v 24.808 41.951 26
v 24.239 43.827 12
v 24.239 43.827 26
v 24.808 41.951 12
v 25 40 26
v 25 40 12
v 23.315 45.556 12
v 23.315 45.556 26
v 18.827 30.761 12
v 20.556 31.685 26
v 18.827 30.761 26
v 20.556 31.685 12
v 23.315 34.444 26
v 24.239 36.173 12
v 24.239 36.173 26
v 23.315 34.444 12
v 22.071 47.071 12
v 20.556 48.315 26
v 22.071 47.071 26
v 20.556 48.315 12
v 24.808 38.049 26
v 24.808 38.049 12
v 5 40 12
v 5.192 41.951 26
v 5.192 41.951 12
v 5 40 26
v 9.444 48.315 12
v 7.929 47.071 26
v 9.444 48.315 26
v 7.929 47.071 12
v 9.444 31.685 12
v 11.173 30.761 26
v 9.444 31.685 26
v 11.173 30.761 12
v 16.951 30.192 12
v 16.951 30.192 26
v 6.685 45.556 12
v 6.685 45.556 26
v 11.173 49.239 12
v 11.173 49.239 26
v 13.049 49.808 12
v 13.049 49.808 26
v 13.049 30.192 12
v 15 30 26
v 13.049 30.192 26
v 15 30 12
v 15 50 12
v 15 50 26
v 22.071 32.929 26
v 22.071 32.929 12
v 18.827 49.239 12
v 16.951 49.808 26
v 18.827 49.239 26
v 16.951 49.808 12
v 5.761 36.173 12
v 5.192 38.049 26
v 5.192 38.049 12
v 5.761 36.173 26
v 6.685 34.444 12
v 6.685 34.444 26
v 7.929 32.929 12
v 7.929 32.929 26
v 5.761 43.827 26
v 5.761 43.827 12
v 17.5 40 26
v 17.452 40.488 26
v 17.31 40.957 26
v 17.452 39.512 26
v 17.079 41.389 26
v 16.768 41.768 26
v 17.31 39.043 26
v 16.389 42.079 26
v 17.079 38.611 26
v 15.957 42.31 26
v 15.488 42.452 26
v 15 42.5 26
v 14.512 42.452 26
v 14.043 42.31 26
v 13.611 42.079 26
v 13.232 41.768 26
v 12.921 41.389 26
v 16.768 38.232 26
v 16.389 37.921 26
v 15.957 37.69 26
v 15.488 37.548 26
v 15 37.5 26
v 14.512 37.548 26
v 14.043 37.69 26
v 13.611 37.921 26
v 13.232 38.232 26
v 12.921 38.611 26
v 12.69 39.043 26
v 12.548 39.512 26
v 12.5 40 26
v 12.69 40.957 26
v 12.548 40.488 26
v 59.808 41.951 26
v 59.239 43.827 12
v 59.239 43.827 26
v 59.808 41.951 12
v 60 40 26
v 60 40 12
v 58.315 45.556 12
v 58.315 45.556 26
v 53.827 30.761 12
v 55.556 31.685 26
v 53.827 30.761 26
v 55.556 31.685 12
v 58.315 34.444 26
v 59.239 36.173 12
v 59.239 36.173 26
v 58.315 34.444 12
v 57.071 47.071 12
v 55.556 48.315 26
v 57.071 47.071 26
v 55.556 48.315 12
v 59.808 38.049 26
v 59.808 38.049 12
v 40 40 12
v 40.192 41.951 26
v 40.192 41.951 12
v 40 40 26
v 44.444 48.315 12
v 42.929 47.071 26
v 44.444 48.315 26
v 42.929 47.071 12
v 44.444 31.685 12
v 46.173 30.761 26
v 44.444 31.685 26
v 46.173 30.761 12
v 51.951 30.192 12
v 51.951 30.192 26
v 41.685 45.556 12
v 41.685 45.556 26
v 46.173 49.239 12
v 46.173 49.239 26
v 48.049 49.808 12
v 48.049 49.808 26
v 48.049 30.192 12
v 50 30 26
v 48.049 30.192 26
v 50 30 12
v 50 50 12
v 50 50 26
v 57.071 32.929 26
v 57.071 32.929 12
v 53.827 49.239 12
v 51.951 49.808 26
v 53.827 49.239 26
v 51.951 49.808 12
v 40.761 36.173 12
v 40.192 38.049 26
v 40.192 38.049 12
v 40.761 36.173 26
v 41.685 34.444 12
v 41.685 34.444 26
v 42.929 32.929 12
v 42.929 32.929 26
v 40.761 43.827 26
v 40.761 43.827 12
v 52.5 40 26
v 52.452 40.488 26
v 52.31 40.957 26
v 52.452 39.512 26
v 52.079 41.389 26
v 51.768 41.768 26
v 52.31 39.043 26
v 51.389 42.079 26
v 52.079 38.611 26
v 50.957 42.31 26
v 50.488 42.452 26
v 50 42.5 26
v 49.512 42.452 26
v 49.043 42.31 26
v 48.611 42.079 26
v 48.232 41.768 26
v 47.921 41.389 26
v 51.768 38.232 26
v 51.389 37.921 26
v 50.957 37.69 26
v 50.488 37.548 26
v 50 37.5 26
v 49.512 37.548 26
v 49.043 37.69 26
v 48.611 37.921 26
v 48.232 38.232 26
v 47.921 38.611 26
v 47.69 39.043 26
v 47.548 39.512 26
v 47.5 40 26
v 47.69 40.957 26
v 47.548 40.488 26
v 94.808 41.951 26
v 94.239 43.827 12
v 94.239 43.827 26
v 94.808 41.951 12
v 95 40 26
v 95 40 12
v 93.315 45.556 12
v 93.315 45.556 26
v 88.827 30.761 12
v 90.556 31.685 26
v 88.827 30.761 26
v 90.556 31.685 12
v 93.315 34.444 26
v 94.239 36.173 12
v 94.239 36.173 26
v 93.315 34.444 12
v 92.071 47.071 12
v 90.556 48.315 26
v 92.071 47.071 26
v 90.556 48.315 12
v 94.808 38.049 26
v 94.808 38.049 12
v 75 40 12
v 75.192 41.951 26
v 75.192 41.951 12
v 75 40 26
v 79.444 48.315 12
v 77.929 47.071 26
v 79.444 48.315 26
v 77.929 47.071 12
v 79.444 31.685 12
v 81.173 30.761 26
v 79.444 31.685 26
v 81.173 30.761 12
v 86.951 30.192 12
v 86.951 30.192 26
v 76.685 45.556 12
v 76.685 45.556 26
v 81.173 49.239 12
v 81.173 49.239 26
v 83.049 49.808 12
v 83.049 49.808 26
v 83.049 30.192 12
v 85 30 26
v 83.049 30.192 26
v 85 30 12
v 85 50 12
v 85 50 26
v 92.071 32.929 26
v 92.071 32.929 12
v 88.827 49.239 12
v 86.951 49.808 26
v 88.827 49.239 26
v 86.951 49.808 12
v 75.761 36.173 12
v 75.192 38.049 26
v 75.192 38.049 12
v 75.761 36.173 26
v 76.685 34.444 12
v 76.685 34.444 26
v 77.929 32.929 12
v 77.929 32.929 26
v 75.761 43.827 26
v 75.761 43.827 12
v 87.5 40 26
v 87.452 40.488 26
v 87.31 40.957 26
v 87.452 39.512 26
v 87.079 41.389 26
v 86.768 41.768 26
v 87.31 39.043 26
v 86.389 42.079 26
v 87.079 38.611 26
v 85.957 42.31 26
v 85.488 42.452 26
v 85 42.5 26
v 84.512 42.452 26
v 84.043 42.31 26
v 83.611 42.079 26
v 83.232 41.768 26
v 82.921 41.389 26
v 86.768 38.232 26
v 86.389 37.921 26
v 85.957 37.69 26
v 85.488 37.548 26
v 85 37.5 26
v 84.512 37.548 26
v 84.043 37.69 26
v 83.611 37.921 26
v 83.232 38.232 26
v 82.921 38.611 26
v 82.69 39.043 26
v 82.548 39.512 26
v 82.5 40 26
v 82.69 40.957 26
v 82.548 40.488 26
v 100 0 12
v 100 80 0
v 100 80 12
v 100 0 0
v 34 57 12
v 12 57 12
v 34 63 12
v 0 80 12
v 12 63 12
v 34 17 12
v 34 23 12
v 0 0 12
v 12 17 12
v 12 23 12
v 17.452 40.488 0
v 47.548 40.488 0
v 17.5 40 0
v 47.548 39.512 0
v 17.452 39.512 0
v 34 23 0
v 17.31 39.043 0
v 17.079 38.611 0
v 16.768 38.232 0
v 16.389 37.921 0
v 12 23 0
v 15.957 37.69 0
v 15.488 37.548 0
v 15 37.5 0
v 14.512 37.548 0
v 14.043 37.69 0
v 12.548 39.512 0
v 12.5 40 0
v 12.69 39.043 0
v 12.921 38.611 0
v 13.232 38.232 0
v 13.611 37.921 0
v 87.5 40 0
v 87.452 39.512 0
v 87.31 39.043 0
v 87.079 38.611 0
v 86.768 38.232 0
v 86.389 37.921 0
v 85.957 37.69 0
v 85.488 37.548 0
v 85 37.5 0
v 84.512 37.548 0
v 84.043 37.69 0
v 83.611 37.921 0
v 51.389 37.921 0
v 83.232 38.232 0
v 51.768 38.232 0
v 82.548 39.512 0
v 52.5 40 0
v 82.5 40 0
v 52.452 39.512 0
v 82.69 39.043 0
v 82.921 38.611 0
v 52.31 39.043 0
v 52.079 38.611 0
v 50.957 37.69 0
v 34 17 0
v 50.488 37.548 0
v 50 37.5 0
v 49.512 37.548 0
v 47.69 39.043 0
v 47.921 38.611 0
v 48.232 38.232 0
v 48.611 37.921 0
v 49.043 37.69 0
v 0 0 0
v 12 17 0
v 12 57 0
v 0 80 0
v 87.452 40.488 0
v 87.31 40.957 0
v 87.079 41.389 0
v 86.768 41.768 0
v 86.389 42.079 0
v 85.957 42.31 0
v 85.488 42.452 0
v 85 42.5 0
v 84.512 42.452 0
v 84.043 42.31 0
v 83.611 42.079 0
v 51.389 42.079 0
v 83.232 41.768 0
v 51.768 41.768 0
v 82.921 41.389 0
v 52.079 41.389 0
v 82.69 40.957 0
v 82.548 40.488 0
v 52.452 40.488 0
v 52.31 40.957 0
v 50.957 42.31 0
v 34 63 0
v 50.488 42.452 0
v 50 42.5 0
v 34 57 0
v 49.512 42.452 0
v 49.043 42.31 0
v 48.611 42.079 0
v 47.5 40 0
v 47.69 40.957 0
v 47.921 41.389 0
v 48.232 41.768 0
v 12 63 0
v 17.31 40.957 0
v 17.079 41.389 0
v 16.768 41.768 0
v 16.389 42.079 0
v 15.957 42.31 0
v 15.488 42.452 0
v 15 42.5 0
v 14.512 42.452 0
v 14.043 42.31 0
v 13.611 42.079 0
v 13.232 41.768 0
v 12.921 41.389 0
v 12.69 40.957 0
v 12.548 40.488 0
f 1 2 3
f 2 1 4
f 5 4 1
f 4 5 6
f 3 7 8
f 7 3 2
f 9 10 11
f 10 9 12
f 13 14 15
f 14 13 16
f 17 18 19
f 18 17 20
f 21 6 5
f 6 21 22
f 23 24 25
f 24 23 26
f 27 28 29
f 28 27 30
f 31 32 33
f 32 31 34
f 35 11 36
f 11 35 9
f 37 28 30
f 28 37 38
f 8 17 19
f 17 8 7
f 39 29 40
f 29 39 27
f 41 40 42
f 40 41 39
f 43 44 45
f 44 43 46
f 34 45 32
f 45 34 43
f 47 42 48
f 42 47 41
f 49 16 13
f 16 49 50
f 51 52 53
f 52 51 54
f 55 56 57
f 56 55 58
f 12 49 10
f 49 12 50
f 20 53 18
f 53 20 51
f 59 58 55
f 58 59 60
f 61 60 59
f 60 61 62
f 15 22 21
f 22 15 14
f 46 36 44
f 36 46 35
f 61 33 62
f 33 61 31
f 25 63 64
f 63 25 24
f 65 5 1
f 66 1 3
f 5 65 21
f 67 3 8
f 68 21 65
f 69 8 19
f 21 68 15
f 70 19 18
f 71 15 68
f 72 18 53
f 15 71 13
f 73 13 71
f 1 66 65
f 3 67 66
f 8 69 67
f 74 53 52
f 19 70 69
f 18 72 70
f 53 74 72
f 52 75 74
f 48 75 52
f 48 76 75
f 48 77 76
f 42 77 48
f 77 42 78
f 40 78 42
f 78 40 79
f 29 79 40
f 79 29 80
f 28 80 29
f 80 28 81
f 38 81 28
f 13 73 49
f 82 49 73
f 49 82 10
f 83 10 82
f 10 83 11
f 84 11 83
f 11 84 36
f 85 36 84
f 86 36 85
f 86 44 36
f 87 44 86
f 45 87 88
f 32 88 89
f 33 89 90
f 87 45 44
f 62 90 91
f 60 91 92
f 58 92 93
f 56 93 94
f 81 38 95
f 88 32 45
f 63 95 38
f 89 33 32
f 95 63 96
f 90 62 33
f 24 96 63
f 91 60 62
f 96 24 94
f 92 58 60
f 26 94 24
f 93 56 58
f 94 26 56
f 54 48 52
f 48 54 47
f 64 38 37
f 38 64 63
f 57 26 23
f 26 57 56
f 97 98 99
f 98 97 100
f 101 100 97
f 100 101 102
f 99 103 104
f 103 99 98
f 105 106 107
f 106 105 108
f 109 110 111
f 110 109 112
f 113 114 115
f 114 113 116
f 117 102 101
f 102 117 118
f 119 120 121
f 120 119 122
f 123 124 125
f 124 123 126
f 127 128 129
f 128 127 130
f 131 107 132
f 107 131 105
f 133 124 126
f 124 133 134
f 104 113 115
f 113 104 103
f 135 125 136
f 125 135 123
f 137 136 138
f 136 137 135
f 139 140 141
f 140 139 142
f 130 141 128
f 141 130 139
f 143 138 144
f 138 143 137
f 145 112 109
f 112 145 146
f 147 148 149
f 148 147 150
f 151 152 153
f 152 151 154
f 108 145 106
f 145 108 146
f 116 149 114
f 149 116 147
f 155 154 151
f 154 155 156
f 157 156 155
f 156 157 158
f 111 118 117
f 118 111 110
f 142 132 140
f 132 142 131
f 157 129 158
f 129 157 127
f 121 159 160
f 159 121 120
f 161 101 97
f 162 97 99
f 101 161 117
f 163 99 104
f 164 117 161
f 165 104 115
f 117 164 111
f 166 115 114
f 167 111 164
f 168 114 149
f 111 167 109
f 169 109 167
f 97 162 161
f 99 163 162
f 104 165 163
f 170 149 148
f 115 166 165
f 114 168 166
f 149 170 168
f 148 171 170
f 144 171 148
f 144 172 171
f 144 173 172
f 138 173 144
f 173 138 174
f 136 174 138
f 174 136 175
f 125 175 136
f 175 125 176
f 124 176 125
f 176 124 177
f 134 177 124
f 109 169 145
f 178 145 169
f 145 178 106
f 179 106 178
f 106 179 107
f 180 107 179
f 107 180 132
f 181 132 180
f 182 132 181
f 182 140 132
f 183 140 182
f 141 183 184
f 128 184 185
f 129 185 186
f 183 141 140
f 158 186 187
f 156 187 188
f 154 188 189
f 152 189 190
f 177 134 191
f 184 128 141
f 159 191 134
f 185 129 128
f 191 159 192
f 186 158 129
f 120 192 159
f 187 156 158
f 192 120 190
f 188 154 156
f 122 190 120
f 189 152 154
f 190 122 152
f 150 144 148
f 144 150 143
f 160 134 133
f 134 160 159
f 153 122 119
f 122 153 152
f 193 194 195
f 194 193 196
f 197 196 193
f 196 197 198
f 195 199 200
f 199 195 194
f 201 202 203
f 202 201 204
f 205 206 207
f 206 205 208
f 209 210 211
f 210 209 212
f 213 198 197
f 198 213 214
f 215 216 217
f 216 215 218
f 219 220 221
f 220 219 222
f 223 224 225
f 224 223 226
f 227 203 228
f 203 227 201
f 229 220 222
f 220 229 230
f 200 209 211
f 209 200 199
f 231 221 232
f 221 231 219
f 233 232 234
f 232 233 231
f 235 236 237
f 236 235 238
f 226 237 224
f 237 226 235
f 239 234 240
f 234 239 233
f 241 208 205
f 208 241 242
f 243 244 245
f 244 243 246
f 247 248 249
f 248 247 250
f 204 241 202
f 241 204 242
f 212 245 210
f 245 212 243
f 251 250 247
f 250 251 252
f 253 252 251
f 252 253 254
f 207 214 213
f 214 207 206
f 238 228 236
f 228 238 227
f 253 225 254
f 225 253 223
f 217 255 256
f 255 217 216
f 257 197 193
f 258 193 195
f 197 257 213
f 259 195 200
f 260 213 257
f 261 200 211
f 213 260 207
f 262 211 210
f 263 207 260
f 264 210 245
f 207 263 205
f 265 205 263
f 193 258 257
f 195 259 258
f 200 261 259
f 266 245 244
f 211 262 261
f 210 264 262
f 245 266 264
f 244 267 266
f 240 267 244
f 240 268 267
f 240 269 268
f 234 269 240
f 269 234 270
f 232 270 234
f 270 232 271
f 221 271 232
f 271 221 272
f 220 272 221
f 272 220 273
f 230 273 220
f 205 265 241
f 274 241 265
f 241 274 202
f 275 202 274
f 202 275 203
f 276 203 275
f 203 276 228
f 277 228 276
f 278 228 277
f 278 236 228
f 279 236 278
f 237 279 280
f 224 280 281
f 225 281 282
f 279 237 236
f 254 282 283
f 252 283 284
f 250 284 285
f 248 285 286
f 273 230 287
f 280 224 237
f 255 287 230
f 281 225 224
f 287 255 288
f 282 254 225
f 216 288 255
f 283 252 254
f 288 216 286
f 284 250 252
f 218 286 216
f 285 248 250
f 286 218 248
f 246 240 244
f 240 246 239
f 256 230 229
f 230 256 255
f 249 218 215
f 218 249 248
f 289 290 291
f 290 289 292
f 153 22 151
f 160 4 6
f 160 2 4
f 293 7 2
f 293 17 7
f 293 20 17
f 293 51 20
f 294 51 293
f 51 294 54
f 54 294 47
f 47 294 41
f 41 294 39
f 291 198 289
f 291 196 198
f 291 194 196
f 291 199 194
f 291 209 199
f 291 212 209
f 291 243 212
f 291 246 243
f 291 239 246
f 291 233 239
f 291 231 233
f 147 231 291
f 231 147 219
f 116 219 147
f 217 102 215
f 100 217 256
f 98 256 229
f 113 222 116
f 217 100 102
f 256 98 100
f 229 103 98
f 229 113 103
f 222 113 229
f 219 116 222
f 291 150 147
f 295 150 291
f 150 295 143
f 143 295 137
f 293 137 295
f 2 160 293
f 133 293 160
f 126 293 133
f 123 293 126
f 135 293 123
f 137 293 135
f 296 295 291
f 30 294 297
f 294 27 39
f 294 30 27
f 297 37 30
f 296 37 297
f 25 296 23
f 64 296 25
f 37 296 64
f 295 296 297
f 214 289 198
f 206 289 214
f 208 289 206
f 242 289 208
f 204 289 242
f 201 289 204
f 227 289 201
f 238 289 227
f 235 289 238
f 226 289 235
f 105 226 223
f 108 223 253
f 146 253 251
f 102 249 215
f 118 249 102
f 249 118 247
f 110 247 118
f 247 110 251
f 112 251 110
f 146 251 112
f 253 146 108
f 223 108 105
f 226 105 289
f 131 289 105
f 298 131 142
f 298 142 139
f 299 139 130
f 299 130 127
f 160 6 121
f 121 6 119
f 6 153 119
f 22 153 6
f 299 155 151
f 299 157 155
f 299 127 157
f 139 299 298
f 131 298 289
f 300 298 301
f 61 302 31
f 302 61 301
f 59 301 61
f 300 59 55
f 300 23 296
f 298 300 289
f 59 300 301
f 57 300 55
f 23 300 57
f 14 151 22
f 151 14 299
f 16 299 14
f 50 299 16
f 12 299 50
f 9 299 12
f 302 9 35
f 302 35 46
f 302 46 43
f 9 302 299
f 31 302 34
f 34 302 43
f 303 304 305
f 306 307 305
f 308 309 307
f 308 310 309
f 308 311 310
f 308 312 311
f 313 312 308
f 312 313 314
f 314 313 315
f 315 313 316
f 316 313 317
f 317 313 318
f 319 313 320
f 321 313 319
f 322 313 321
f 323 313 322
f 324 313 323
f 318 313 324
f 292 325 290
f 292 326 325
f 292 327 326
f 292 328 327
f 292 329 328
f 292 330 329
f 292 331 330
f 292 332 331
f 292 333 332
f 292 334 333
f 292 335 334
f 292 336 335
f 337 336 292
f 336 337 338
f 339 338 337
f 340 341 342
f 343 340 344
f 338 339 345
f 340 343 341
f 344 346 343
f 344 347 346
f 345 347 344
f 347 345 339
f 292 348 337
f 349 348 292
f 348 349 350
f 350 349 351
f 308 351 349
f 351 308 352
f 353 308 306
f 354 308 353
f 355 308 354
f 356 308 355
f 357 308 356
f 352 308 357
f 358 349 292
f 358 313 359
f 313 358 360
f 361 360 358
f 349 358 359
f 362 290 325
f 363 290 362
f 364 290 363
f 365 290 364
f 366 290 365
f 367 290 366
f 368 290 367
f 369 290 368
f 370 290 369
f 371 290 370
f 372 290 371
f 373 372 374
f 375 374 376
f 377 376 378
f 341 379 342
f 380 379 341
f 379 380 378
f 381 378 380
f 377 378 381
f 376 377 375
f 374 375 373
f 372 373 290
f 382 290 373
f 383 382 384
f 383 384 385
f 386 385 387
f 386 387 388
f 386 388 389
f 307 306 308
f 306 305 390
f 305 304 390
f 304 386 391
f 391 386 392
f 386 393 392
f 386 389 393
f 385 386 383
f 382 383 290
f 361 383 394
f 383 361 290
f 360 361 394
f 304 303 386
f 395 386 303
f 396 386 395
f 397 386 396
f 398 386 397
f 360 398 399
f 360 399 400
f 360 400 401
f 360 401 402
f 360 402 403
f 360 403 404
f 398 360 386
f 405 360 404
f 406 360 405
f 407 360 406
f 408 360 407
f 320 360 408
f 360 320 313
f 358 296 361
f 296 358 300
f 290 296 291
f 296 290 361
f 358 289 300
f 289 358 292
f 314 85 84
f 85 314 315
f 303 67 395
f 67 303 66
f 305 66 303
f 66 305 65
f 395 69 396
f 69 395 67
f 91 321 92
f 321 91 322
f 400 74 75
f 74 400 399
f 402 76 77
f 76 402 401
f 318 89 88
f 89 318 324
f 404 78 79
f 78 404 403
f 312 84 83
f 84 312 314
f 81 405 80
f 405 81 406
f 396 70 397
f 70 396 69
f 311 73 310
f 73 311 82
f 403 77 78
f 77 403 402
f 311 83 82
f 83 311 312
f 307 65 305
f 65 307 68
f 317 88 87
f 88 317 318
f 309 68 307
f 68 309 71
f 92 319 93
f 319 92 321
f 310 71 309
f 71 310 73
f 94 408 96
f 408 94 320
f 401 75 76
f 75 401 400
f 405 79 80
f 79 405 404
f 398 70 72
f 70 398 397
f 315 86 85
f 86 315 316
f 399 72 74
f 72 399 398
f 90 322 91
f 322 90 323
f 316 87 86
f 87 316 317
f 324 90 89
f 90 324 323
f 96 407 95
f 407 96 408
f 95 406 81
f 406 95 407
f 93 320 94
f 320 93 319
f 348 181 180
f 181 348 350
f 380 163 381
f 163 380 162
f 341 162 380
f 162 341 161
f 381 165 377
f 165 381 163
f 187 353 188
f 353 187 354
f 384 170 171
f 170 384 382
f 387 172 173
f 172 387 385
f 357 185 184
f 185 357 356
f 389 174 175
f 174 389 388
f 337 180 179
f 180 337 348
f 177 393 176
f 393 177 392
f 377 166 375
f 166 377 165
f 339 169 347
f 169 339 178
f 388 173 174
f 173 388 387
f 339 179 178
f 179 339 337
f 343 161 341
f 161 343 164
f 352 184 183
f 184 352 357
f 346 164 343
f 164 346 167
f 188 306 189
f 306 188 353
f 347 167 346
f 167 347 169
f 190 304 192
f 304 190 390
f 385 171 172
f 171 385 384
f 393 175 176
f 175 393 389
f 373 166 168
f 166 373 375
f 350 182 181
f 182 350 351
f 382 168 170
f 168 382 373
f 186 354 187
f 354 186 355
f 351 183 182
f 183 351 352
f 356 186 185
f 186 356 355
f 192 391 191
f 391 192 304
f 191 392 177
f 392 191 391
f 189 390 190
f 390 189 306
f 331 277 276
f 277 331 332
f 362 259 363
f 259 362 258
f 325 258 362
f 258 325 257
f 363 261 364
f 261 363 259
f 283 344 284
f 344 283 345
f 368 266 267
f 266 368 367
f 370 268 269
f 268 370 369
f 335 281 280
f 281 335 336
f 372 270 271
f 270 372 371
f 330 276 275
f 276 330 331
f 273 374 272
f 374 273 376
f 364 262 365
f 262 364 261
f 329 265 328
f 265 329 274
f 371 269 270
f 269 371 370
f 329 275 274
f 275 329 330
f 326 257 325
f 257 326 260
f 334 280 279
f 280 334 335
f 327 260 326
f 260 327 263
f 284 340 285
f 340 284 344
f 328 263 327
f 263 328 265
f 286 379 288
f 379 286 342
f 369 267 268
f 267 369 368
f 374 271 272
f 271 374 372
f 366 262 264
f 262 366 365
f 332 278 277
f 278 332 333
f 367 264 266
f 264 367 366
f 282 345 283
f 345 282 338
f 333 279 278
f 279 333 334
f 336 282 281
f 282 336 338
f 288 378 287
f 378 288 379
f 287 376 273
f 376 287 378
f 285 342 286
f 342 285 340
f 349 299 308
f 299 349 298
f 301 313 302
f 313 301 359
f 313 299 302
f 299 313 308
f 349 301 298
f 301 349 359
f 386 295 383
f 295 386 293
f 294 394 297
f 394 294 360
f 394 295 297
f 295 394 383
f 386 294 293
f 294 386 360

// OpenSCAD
$fn = 32;

// ----------------------------------------------------------------------
// Drill jig: three_boss_slot jig
// ----------------------------------------------------------------------

// --- parameters (mm) ---
plate_l = 100;            // plate length, X
plate_w = 80;             // plate width, Y
plate_t = 12;             // plate thickness
boss_d = 20;              // guide boss diameter
boss_h = 15;              // boss height above the plate
guide_d = 5;              // guide hole diameter
boss_pitch = 35;          // boss pitch
slot_w = 6;               // clamp slot width
slot_l = 22;              // clamp slot length
slot_x = 12;              // slot start X

n_boss = 3;  // guide bosses
boss_x0 = (plate_l - (n_boss - 1) * boss_pitch) / 2;  // first boss X
boss_top = plate_t - 1 + boss_h;  // boss crown height
total_h = boss_top;  // overall height

difference() {
  union() {
  cube([plate_l, plate_w, plate_t]);
  for (i = [0 : n_boss - 1])
    translate([boss_x0 + i * boss_pitch, plate_w / 2, plate_t - 1])
      cylinder(h = boss_h, d = boss_d);
  }
  for (i = [0 : n_boss - 1])
    translate([boss_x0 + i * boss_pitch, plate_w / 2, -1])
      cylinder(h = plate_t + boss_h, d = guide_d);
  for (cy = [plate_w * 0.25, plate_w * 0.75])
    translate([slot_x, cy - slot_w / 2, -1])
      cube([slot_l, slot_w, plate_t + 2]);
}
